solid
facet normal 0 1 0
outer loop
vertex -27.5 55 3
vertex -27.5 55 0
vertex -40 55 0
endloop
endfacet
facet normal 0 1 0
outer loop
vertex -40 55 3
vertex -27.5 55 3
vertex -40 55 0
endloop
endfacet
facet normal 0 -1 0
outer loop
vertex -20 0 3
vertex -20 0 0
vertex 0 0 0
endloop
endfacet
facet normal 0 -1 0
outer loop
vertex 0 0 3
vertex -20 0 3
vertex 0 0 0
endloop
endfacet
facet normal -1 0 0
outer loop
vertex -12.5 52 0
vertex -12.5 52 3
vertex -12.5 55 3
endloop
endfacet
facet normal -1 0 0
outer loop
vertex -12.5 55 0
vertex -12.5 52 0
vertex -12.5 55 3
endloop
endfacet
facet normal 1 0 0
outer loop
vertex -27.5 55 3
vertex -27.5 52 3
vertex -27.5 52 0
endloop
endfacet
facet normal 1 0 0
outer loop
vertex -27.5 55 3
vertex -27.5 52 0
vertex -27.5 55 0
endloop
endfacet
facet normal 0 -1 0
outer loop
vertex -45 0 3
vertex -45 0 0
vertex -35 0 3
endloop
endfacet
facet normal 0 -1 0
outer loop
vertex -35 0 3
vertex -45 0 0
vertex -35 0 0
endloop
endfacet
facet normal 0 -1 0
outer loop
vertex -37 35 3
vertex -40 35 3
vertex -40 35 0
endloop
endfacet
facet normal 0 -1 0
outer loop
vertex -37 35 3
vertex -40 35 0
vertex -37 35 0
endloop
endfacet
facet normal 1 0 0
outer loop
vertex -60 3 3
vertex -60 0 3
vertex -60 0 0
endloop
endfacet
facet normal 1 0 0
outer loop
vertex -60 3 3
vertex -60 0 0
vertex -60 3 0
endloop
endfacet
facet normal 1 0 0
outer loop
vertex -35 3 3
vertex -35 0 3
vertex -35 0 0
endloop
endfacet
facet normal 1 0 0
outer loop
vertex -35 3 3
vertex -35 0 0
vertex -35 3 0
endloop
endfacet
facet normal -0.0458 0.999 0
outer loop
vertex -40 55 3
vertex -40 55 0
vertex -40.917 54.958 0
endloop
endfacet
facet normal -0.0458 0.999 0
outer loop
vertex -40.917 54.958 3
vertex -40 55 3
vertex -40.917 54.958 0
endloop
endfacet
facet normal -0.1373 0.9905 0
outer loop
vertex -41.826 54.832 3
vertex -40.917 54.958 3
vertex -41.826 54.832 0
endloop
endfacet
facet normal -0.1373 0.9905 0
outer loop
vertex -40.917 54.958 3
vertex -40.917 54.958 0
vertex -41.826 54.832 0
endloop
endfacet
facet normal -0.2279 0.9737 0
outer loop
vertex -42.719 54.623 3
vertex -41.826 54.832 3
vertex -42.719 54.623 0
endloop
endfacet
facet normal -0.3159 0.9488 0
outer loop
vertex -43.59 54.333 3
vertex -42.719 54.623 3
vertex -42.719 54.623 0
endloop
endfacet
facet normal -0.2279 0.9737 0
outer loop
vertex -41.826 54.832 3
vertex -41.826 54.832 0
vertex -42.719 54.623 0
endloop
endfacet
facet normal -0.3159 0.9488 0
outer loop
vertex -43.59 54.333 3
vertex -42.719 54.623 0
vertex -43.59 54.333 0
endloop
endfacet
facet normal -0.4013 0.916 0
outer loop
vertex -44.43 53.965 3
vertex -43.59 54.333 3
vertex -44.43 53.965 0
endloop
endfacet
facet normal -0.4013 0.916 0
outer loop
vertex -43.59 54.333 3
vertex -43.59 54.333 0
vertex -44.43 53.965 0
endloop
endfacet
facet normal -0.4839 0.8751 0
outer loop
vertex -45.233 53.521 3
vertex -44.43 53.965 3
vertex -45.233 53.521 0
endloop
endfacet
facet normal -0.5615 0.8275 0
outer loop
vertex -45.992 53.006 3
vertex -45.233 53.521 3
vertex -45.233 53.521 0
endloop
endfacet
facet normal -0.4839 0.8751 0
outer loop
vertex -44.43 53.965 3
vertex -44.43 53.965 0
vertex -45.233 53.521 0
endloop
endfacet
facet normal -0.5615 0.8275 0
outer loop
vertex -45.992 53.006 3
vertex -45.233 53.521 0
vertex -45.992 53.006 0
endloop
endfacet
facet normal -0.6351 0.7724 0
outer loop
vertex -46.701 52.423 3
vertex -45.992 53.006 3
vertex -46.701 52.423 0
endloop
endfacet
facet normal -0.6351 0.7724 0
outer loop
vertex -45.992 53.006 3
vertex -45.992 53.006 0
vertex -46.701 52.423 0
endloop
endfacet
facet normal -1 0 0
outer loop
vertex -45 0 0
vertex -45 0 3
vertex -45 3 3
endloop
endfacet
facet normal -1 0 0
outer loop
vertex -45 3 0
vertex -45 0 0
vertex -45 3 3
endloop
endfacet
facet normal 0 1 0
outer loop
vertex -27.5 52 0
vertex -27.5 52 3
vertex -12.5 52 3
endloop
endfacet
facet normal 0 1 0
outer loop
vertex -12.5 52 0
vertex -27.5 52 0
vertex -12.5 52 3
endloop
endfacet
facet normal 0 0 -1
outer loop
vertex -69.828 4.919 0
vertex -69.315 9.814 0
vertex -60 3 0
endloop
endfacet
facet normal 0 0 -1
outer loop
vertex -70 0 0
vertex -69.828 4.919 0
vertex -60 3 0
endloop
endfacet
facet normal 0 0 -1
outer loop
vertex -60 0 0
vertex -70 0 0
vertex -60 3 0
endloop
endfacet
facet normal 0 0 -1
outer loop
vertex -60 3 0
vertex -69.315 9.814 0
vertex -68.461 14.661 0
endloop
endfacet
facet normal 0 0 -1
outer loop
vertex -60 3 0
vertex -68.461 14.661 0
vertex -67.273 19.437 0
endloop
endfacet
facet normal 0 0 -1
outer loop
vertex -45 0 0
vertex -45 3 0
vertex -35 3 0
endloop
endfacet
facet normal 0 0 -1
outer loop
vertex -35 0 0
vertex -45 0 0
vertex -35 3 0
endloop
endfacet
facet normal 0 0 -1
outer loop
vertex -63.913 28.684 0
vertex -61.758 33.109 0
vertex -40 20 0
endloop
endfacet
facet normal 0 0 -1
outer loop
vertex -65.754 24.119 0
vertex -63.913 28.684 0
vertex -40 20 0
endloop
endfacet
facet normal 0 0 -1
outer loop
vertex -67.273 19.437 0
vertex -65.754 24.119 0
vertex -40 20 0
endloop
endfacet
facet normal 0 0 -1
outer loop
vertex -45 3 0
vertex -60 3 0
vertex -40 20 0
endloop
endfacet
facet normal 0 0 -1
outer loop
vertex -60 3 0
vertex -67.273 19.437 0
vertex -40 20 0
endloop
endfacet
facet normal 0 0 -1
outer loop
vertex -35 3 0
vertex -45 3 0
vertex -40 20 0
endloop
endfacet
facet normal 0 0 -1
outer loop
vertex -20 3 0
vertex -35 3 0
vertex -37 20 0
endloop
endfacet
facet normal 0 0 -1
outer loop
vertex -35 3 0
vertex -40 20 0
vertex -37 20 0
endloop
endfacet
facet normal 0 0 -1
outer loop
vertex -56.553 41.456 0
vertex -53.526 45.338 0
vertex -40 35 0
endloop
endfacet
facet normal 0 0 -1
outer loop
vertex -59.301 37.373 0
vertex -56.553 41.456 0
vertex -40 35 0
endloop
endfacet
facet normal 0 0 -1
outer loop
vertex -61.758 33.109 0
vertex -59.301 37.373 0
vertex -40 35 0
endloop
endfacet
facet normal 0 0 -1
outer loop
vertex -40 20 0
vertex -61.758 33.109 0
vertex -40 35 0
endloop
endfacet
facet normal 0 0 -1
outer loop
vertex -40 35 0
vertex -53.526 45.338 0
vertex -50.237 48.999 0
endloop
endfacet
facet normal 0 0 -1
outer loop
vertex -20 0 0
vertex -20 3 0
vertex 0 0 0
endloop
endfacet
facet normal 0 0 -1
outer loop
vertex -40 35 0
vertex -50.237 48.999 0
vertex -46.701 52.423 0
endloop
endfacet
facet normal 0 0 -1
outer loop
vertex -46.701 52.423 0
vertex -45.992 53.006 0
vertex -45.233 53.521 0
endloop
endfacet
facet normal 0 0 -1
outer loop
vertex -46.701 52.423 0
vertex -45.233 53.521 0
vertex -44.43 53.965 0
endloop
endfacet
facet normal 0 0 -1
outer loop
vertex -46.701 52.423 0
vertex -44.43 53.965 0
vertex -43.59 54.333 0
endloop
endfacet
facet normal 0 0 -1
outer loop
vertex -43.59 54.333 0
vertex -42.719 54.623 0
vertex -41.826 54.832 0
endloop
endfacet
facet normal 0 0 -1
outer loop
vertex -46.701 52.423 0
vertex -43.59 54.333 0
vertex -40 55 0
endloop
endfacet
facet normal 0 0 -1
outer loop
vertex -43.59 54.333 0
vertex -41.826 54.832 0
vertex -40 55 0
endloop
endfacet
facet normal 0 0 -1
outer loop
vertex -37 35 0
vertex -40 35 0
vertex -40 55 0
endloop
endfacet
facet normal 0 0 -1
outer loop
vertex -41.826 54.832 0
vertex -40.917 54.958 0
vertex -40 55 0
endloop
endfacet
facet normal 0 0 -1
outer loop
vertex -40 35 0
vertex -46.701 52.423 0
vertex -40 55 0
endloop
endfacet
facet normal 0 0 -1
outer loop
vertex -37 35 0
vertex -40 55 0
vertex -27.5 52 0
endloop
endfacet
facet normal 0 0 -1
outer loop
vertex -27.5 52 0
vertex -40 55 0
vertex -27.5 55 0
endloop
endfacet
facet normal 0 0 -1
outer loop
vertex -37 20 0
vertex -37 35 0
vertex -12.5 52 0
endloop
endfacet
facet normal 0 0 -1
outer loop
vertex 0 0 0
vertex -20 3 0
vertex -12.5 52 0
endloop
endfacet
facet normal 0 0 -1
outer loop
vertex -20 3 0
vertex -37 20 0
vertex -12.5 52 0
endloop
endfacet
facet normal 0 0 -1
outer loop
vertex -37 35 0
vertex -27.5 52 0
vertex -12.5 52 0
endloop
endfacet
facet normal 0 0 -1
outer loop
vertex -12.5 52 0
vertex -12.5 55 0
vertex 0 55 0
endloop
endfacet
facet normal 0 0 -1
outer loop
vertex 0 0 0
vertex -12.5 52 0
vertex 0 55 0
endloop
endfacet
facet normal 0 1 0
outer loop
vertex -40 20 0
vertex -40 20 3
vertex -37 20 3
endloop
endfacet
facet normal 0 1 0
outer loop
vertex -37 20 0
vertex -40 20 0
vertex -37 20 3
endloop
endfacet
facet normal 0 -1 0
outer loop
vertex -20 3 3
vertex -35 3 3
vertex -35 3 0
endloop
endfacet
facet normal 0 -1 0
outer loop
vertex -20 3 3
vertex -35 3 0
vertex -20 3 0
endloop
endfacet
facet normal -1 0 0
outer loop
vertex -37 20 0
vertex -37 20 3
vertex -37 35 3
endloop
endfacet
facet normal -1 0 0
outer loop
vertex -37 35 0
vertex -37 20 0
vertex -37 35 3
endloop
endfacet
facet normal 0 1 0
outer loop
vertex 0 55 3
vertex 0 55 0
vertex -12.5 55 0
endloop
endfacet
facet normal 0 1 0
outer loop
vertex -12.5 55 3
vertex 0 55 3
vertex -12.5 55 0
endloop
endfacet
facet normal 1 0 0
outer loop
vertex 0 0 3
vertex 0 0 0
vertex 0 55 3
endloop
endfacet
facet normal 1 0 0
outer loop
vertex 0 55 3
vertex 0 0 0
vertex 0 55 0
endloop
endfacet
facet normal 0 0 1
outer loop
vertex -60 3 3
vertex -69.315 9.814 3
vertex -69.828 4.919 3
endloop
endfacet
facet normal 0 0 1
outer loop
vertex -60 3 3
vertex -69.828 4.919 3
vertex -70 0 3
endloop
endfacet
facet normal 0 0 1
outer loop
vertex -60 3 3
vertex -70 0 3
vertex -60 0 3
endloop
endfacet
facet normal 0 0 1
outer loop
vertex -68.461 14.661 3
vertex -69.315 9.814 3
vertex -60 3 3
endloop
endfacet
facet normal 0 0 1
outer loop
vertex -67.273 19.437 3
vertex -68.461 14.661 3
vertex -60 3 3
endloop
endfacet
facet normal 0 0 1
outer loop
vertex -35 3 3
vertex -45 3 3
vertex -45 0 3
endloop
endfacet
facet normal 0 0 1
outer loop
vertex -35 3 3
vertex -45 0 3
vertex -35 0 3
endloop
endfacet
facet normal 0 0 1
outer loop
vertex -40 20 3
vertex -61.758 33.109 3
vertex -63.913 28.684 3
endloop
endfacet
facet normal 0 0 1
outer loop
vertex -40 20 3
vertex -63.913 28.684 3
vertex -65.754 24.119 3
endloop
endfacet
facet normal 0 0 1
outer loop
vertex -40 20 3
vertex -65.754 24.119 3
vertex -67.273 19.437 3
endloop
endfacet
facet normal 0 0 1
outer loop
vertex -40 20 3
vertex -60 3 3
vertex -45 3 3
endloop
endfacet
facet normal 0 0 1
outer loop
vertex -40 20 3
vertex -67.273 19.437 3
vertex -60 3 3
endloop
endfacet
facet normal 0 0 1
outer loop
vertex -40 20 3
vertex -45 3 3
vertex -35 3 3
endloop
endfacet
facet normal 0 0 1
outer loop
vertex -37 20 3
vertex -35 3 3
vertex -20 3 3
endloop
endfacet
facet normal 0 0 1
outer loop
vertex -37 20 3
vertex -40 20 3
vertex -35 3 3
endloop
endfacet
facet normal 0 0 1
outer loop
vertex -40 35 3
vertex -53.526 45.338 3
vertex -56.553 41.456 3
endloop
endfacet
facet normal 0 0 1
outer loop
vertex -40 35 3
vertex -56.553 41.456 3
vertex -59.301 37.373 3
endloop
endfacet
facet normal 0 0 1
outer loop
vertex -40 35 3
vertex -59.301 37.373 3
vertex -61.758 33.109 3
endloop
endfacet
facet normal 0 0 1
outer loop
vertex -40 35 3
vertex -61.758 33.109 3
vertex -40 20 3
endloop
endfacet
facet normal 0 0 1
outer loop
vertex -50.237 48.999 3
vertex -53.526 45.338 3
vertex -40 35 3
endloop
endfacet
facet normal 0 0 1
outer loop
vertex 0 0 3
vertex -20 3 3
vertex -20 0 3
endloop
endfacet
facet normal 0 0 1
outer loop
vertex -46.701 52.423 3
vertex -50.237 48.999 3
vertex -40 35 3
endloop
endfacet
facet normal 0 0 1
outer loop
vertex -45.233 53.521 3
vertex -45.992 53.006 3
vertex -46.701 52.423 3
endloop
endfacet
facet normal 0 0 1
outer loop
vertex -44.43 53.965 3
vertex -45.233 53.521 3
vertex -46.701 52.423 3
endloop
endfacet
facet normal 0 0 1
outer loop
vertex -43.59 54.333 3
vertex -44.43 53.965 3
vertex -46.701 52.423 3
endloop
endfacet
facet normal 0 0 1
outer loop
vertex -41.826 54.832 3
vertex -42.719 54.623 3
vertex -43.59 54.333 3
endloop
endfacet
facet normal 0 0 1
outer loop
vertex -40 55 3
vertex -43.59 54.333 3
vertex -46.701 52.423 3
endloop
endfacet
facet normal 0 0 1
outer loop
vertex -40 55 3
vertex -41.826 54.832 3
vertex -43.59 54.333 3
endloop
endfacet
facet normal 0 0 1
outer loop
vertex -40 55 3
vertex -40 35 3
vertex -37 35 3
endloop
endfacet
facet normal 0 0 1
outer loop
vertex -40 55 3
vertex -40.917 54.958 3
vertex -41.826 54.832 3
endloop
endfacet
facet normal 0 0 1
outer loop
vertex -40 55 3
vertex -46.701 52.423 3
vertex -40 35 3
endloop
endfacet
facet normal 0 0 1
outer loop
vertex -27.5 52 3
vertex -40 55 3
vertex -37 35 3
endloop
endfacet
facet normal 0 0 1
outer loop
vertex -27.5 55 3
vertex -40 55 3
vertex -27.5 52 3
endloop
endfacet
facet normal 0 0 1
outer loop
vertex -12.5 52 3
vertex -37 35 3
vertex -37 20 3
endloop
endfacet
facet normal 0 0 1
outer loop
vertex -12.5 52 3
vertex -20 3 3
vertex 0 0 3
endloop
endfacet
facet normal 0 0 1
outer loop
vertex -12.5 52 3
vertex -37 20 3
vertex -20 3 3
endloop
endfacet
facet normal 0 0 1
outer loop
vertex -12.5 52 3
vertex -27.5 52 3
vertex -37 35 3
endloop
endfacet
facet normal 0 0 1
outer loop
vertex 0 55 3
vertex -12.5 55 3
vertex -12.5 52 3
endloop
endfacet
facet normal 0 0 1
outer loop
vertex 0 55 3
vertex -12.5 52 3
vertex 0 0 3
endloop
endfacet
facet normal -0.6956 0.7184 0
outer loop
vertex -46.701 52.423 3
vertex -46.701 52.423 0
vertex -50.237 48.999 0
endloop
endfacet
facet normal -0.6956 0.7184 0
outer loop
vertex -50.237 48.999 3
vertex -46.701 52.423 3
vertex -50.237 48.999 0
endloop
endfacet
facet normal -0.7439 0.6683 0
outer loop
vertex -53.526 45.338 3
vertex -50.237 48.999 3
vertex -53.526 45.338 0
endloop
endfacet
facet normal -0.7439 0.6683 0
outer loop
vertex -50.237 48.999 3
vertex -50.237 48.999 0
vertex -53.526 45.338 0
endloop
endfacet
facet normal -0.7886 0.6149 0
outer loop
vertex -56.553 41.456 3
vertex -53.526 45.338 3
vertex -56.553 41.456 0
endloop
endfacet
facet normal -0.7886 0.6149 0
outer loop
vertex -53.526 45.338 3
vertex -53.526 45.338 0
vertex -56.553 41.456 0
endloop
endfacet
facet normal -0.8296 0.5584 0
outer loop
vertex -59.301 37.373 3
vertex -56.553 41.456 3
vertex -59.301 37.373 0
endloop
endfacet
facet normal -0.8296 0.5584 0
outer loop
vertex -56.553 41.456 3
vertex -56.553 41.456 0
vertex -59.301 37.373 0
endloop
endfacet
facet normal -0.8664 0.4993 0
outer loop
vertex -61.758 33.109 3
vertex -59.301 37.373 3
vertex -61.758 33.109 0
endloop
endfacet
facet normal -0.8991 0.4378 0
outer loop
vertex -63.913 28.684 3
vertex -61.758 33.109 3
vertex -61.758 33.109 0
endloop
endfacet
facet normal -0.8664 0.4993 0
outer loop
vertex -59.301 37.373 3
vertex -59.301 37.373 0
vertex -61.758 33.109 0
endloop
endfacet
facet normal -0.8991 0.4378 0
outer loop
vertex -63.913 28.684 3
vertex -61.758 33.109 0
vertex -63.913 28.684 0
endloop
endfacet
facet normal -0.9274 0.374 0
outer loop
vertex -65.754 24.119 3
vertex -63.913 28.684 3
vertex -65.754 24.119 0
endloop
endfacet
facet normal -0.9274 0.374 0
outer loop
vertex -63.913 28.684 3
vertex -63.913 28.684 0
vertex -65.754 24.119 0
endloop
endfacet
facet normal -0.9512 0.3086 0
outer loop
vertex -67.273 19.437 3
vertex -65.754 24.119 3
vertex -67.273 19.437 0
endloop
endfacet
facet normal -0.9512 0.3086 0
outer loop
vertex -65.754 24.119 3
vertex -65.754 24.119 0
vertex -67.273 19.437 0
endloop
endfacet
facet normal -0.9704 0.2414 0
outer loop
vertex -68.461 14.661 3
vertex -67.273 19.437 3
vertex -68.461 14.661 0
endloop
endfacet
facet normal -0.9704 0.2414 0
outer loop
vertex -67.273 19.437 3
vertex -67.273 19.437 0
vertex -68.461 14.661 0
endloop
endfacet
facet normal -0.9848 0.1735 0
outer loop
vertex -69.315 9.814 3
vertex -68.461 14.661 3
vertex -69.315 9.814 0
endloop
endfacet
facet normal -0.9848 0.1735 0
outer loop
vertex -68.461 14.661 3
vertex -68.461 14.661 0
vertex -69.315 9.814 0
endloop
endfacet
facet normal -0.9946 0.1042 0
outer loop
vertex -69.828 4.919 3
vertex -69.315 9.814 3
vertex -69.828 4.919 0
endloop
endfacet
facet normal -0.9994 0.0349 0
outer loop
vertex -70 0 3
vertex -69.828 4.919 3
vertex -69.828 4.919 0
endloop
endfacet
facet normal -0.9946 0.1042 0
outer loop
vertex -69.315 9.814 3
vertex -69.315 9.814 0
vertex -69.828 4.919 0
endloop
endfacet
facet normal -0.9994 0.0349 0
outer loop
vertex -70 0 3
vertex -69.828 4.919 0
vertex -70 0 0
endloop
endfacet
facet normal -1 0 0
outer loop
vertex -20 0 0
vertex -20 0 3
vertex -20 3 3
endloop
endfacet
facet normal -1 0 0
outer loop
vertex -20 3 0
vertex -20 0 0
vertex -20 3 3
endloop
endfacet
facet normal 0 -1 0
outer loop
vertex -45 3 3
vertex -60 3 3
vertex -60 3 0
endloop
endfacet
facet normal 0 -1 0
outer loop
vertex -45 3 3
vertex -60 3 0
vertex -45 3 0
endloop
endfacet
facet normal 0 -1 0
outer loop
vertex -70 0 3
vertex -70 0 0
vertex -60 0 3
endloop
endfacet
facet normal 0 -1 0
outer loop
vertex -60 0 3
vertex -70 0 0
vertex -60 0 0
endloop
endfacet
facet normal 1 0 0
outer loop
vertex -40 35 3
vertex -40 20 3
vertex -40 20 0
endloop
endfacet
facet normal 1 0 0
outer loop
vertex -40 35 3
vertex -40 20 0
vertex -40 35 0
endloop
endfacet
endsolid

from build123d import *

# Parameters (mm, degrees)
BOSS_EXTRUDE1_DEPTH = 3
SKETCH2_W           = 15
SKETCH2_H           = 3
SKETCH2_W_2         = 3
SKETCH2_H_2         = 15
CUT_EXTRUDE1_DEPTH  = 90.073003767


with BuildPart() as part:
    # Sketch1 → Boss-Extrude1 (new body)
    with BuildSketch(Plane.XY):
        with BuildLine():
            Line((0, 0), (0, 55))
            Line((0, 55), (-40, 55))
            ThreePointArc((-40, 55), (-43.589790793, 54.333456062), (-46.701030928, 52.422680412))
            ThreePointArc((-46.701030928, 52.422680412), (-63.912940621, 28.683529165), (-70, 0))
            Line((-70, 0), (0, 0))
        make_face()
    extrude(amount=BOSS_EXTRUDE1_DEPTH)

    # Sketch2 → Cut-Extrude1 (cut, through all)
    with BuildSketch(Plane.XY.offset(3)):
        with Locations((-20, 53.5)):
            Rectangle(SKETCH2_W, SKETCH2_H)
        with Locations((-27.5, 1.5)):
            Rectangle(SKETCH2_W, SKETCH2_H)
        with Locations((-52.5, 1.5)):
            Rectangle(SKETCH2_W, SKETCH2_H)
        with Locations((-38.5, 27.5)):
            Rectangle(SKETCH2_W_2, SKETCH2_H_2)
    extrude(amount=-CUT_EXTRUDE1_DEPTH, mode=Mode.SUBTRACT)


solid = part.part
